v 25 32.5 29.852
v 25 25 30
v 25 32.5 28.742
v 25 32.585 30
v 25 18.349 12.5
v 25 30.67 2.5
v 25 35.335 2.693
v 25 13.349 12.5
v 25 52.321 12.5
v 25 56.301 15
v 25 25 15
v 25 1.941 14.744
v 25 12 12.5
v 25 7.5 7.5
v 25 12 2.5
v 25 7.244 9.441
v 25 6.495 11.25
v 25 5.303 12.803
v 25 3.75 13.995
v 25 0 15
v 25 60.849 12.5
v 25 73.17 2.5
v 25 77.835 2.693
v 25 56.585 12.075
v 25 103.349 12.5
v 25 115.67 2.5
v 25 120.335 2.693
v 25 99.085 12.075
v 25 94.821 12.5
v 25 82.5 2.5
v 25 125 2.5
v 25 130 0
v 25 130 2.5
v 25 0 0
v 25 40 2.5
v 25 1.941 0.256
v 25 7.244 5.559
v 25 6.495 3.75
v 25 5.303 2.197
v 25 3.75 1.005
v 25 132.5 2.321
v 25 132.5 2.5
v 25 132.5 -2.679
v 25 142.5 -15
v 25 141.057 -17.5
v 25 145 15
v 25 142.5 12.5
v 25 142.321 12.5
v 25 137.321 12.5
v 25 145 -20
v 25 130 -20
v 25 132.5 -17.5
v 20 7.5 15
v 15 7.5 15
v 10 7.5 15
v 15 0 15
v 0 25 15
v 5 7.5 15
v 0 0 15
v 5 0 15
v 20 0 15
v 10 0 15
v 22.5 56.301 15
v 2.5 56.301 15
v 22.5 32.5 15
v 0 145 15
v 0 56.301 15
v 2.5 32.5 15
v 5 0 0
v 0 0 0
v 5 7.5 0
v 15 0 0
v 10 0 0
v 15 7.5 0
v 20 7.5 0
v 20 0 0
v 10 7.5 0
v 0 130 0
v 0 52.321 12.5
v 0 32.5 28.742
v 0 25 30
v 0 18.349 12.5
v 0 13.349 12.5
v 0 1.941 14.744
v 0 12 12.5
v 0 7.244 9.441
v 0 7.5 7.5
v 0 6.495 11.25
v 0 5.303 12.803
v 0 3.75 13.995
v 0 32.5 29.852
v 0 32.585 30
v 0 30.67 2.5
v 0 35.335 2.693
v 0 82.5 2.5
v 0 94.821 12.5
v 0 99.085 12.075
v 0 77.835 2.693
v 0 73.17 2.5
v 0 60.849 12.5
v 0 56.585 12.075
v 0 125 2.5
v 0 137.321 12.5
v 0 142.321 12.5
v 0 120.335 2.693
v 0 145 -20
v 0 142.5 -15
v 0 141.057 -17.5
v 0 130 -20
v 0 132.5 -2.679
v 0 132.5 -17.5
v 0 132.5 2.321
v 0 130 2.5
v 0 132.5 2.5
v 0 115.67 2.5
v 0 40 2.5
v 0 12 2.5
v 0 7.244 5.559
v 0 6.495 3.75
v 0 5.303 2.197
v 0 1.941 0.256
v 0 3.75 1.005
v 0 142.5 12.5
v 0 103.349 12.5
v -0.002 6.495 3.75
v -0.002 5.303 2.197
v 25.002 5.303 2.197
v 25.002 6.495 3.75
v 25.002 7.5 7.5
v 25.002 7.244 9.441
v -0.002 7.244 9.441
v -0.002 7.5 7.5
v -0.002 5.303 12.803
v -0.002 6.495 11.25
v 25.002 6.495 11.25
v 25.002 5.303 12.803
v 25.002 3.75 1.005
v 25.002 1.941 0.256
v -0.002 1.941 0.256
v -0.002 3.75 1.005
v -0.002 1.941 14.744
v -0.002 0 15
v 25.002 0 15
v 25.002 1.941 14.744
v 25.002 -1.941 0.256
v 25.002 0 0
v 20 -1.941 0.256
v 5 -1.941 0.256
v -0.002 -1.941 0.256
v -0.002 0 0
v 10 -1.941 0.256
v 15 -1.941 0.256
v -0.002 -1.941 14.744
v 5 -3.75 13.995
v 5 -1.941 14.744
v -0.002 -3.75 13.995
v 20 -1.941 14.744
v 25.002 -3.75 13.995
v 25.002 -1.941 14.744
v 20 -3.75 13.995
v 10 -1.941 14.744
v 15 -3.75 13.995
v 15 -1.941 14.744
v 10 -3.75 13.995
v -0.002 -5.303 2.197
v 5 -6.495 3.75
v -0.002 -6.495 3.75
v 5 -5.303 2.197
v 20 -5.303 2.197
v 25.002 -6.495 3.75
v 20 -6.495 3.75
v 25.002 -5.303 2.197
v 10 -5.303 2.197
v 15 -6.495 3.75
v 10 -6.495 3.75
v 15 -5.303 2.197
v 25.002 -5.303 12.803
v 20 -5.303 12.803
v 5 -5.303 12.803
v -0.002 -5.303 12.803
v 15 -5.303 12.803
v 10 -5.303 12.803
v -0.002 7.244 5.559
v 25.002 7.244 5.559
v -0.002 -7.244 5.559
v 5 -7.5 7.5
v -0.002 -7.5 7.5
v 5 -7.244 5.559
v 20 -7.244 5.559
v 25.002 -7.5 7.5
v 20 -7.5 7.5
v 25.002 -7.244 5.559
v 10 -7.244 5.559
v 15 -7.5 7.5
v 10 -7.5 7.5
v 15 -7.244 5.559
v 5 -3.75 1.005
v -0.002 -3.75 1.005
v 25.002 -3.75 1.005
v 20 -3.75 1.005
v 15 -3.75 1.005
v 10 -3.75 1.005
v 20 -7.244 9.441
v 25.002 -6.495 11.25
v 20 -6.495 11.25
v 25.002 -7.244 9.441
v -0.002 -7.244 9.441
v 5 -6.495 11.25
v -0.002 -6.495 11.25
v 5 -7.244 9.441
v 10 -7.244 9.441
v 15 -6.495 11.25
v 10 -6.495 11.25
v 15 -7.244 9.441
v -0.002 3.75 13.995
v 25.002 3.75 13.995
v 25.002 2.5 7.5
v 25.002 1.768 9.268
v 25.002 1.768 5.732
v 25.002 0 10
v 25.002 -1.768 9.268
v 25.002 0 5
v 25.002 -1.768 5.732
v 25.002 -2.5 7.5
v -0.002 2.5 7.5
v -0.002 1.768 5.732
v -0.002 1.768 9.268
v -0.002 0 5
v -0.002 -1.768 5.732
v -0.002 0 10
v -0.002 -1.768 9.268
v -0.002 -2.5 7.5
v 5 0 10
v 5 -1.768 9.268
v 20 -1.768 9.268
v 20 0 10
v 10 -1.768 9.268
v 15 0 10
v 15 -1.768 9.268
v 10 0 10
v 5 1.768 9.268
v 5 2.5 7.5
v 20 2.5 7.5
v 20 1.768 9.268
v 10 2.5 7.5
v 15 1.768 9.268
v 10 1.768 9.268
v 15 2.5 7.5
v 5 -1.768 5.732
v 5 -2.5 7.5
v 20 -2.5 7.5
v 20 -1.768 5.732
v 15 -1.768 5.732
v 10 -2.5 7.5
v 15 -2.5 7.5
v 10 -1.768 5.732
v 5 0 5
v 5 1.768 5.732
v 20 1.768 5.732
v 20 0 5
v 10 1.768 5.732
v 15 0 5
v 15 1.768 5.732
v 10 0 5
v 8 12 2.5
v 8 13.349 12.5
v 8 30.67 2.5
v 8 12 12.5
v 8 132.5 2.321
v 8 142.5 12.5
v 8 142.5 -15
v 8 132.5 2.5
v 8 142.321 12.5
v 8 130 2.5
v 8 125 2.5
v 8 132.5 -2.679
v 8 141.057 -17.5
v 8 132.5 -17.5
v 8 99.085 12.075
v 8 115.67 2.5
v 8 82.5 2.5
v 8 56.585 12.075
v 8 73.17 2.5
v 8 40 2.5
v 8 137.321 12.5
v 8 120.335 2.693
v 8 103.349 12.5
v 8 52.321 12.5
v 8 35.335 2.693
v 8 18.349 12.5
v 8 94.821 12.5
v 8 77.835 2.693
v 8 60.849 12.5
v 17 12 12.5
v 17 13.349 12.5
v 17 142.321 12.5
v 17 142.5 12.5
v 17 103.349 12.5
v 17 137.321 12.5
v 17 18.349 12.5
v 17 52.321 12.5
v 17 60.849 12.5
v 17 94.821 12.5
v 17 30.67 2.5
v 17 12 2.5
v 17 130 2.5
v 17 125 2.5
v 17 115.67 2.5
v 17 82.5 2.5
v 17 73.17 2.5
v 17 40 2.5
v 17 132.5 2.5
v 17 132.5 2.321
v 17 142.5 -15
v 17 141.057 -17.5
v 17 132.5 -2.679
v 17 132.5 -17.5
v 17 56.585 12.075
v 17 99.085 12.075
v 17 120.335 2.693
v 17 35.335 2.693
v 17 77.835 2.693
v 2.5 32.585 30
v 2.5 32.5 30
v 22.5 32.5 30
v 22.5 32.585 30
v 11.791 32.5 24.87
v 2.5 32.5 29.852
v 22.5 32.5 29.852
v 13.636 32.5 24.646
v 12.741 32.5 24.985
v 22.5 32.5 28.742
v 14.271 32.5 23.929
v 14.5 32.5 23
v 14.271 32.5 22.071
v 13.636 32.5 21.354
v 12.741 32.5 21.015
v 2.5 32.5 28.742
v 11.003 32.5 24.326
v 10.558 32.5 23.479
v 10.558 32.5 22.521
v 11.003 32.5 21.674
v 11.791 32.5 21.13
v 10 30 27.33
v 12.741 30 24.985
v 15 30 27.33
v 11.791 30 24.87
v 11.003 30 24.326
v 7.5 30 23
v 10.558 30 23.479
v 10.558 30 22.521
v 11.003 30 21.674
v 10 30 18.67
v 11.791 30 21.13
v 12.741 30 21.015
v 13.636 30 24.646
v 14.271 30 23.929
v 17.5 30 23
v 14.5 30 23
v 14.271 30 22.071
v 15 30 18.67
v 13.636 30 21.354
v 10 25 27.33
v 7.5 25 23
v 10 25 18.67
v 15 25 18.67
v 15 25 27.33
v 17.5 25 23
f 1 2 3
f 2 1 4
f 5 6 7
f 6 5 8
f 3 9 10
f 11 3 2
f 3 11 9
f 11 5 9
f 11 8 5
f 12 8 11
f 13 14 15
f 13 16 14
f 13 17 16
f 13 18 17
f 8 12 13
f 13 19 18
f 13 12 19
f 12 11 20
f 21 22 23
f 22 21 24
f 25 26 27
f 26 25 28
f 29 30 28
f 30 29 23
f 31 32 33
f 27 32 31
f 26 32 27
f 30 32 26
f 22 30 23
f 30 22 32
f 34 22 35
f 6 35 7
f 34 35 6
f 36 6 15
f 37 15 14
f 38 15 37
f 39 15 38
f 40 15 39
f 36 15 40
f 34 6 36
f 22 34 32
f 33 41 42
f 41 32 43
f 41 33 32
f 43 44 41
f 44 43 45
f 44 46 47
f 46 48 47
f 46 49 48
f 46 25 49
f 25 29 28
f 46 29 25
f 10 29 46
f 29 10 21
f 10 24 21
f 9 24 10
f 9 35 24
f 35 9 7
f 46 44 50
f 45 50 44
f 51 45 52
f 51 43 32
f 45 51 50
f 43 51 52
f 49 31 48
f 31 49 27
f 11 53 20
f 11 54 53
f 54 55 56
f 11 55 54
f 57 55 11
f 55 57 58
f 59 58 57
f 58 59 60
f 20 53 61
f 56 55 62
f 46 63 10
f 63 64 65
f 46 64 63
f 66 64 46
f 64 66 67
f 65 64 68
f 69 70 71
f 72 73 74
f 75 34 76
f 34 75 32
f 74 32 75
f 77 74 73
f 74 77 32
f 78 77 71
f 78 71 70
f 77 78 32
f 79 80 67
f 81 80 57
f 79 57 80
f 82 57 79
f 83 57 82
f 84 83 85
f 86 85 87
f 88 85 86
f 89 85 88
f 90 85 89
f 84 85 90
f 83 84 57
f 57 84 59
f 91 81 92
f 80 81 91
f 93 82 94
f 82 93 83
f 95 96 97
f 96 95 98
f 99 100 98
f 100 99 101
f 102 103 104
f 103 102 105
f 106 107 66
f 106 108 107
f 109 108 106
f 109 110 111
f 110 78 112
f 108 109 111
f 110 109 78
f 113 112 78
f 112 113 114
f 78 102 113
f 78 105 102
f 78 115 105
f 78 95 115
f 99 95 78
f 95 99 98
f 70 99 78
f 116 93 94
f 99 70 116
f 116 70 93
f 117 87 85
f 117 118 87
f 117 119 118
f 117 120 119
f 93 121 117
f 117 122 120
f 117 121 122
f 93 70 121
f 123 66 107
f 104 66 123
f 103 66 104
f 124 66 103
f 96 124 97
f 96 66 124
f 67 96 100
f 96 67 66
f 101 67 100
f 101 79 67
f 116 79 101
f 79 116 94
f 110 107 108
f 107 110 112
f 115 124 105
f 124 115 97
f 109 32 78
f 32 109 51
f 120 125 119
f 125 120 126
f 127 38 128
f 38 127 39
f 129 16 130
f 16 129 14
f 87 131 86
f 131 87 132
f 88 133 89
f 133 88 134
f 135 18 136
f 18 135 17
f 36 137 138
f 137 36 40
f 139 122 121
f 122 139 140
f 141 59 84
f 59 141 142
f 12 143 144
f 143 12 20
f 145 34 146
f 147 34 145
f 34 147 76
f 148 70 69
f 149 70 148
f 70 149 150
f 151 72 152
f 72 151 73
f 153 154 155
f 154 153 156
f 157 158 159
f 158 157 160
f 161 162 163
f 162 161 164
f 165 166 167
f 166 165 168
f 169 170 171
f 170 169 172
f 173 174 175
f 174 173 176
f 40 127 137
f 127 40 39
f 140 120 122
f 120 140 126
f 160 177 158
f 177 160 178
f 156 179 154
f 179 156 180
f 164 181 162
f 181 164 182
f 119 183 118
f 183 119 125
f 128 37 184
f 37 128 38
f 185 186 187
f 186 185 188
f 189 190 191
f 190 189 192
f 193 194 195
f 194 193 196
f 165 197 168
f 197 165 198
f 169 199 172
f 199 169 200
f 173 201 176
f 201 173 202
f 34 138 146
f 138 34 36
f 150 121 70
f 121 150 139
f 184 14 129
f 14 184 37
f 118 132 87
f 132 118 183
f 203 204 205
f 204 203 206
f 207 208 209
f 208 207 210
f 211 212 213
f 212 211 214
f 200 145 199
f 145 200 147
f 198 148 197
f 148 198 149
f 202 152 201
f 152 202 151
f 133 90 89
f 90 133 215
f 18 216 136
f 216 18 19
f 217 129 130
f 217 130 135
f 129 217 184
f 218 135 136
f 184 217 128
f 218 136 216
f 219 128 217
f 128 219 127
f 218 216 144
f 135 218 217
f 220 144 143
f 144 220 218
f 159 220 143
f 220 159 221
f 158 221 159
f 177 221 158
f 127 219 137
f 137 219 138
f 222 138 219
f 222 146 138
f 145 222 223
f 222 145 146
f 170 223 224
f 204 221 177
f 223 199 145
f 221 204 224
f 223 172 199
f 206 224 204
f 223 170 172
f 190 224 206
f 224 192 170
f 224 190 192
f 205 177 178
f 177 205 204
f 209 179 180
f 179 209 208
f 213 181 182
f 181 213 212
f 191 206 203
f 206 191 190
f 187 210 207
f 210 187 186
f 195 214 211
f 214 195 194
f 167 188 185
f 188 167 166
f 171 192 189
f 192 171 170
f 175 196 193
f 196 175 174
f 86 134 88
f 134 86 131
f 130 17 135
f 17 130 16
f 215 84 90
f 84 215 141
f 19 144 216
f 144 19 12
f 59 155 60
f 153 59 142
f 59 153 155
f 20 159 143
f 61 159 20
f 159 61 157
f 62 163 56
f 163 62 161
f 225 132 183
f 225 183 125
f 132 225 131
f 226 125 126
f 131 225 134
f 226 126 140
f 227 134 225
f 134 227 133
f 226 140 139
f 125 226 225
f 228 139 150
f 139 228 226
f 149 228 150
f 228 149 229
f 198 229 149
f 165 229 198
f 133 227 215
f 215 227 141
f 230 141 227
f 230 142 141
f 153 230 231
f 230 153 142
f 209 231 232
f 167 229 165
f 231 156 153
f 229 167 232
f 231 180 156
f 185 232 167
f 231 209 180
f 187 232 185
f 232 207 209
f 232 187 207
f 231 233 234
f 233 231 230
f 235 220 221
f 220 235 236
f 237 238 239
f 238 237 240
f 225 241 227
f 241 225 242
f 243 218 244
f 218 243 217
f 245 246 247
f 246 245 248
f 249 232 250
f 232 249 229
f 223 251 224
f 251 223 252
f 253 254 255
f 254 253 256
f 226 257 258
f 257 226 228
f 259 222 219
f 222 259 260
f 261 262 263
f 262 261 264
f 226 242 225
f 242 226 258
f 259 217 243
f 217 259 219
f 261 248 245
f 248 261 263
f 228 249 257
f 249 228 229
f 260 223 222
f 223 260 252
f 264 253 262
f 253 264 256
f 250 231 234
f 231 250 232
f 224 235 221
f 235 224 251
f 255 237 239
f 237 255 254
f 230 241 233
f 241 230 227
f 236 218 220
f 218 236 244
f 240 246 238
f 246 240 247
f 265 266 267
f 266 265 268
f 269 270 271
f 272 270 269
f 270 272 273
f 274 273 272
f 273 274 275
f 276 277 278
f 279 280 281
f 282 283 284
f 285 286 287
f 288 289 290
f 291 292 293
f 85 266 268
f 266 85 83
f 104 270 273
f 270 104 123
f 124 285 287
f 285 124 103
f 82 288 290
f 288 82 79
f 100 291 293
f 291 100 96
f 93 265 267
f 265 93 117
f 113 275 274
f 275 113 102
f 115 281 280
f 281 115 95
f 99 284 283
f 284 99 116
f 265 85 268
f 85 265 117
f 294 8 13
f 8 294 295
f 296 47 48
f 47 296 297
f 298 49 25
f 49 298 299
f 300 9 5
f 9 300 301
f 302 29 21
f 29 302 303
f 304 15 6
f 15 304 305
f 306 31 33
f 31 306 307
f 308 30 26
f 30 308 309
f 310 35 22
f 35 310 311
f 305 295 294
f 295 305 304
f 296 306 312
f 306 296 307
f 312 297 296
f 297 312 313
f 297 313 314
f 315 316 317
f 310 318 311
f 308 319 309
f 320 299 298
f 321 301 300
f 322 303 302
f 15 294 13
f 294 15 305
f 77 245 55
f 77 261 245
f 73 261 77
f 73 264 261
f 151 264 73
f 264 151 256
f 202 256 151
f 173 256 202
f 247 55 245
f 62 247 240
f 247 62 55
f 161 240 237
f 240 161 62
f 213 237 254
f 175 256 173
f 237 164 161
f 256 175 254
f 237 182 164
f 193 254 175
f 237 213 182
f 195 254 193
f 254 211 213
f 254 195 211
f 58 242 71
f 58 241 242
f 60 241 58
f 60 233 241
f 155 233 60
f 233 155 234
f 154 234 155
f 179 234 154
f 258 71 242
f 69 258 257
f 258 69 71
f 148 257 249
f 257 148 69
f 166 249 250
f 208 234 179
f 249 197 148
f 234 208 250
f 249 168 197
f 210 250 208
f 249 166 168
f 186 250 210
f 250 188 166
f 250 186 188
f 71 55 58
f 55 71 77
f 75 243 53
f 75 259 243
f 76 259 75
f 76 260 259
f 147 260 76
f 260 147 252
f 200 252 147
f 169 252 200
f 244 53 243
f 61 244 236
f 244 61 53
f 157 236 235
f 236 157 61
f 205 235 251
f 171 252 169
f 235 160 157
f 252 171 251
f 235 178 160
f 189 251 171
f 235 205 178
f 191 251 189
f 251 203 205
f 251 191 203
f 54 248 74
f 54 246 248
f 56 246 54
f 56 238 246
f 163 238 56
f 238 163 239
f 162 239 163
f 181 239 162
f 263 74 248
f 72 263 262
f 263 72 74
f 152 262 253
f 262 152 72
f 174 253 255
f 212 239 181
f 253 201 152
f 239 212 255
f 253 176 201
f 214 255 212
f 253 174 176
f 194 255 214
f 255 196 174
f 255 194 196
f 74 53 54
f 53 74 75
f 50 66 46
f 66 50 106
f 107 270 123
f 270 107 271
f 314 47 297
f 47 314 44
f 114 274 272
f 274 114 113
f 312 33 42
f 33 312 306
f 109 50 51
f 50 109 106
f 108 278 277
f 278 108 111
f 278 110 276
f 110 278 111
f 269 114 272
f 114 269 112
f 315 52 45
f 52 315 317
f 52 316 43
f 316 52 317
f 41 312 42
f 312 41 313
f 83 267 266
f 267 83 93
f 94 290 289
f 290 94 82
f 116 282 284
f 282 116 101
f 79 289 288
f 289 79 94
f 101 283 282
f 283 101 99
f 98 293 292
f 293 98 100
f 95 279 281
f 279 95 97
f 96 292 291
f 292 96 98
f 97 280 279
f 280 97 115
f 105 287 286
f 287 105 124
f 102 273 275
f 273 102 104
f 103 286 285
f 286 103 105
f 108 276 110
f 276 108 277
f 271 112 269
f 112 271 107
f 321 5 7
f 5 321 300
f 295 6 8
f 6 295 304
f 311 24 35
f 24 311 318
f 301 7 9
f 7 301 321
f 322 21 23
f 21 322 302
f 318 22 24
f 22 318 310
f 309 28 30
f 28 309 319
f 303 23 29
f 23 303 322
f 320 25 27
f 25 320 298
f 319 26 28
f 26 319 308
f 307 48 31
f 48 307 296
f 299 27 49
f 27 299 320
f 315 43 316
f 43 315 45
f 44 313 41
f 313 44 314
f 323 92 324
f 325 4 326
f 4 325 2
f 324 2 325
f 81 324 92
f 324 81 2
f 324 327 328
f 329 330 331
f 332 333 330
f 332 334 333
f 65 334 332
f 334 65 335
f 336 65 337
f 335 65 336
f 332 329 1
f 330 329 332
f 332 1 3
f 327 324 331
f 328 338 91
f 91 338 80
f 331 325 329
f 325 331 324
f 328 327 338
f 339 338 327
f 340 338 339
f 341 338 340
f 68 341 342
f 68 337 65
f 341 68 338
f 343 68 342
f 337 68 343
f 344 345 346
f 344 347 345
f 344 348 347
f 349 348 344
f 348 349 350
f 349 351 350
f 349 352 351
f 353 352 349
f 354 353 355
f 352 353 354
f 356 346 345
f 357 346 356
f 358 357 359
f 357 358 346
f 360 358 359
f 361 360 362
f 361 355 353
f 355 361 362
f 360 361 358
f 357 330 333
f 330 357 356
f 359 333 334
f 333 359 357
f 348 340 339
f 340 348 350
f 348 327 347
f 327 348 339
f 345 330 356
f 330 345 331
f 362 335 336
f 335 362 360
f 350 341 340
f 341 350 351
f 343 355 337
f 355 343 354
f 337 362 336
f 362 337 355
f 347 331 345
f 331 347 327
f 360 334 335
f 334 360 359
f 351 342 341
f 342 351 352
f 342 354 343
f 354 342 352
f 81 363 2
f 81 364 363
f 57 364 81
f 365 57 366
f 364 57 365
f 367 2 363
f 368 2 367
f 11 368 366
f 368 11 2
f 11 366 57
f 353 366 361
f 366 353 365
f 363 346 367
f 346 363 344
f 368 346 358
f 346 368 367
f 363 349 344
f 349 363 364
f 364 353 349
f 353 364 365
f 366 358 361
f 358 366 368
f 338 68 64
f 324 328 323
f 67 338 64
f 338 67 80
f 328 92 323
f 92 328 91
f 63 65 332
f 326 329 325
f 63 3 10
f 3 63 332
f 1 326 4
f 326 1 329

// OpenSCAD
module rotcy(rot, r, h) {
	rotate(90, rot)
	cylinder(r = r/2, h = h, center = true);
}
module  clampBeam001() {
	// main beam
	difference() {
		difference() {
			union() {
				cube(size = [25,130,15]);
				translate(v = [12.5, 0, 7.5]){
					rotcy([0, 1, 0], 15, 25.005);
				}
			}
			translate(v = [10, 0, 7.5]){
				rotcy([0, 1, 0], 5, 35);
			}	
		}
		translate(v = [-1,12,2.5]) {
			cube(size = [9,140,10]);
		}
		translate(v = [17,12,2.5]) {
			cube(size = [9,140,10]);
		}
		translate(v = [5,-7.5,-1]){
			cube(size = [5,15,25]);
		}
		translate(v = [15,-7.5,-1]){
			cube(size = [5,15,25]);
		}
	}	
	
}

module clampBeam002() {
	// corner
	translate(v= [0,130,0]) {
		difference() {
			cube(size = [25,15,15]);	
			translate(v = [-1,-2.5,-2.5]) {
				cube(size = [9,15,15]);	
			}
			translate(v = [17,-2.5,-2.5]) {
				cube(size = [9,15,15]);
			}
		
		}
	}
}

module clampBeam003() {
	translate(v= [0,130,-20]) {
		difference() {
			cube(size = [25,15,22.5]);	
			translate(v = [-1,2.5,2.5]) {
				cube(size = [9,10,21]);	
			}
			translate(v = [17,2.5,2.5]) {
				cube(size = [9,10,25]);
			}
		
		}
	}
}

module lattice() {
	
	translate(v = [0,35,0]) {
		rotate(a = 60, v = [1,0,0]) {
			cube(size = [8,2.5, 25]);
		}
	}
	translate(v = [0,35,2.5]) {
		rotate(a =-60, v = [1,0,0]) {	
			cube(size = [8,2.5, 25]);
		}
	}
	translate(v = [0,77.5,0]) {
		rotate(a = 60, v = [1,0,0]) {
			cube(size = [8,2.5, 25]);
		}
	}
	translate(v = [0,77.5,2.5]) {
		rotate(a =-60, v = [1,0,0]) {	
			cube(size = [8,2.5, 25]);
		}
	}
	translate(v = [0,120,0]) {
		rotate(a = 60, v = [1,0,0]) {
			cube(size = [8,2.5, 25]);
		}
	}
	translate(v = [0,120,2.5]) {
		rotate(a =-60, v = [1,0,0]) {	
			cube(size = [8,2.5, 25]);
		}
	}
	translate(v = [0,142.5,-20]) {
		rotate(a = 30, v = [1,0,0]) {
			cube(size = [8,2.5, 24.5]);
		}
	}
	
}

module screwMount() {
	translate(v = [0,30,15]) {
		difference() {
			cube([25,2.5,15]);
			translate(v = [12.5,10,8]) {
				rotate(a = 90, v = [1,0,0]) {
					cylinder(h = 25, r=2, $fs=1);	
				}
			}
		}
		difference() {
			
			
			translate(v = [0, -5, 0]) {
				cube([25,5,15]);
			}
			union() {
			translate(v = [12.5,0.1,8]) {
				rotate(a = 90, v = [1,0,0]) {
					cylinder(h = 10, r=5, $fs=6);
					
				}
			}
			}
		}
		difference() {
			cube([2.5,27,15]);
			translate(v = [-1,43,25]) {
				rotate(a  = 150, v = [1,0,0]){
					cube([5,30,30]);
				}
			}
		
		}
		translate(v = [22.5,0,0]) {
		difference() {
			cube([2.5,27,15]);
			translate(v = [-1,43,25]) {
				rotate(a  = 150, v = [1,0,0]){
					cube([5,30,30]);
				}
			}
		}
		}
	}
	
}

union() {
	clampBeam001();
	clampBeam002();
	clampBeam003();
	
	lattice();
	translate(v = [17,0,0]) {
		lattice();
	}

	screwMount();
	
}
